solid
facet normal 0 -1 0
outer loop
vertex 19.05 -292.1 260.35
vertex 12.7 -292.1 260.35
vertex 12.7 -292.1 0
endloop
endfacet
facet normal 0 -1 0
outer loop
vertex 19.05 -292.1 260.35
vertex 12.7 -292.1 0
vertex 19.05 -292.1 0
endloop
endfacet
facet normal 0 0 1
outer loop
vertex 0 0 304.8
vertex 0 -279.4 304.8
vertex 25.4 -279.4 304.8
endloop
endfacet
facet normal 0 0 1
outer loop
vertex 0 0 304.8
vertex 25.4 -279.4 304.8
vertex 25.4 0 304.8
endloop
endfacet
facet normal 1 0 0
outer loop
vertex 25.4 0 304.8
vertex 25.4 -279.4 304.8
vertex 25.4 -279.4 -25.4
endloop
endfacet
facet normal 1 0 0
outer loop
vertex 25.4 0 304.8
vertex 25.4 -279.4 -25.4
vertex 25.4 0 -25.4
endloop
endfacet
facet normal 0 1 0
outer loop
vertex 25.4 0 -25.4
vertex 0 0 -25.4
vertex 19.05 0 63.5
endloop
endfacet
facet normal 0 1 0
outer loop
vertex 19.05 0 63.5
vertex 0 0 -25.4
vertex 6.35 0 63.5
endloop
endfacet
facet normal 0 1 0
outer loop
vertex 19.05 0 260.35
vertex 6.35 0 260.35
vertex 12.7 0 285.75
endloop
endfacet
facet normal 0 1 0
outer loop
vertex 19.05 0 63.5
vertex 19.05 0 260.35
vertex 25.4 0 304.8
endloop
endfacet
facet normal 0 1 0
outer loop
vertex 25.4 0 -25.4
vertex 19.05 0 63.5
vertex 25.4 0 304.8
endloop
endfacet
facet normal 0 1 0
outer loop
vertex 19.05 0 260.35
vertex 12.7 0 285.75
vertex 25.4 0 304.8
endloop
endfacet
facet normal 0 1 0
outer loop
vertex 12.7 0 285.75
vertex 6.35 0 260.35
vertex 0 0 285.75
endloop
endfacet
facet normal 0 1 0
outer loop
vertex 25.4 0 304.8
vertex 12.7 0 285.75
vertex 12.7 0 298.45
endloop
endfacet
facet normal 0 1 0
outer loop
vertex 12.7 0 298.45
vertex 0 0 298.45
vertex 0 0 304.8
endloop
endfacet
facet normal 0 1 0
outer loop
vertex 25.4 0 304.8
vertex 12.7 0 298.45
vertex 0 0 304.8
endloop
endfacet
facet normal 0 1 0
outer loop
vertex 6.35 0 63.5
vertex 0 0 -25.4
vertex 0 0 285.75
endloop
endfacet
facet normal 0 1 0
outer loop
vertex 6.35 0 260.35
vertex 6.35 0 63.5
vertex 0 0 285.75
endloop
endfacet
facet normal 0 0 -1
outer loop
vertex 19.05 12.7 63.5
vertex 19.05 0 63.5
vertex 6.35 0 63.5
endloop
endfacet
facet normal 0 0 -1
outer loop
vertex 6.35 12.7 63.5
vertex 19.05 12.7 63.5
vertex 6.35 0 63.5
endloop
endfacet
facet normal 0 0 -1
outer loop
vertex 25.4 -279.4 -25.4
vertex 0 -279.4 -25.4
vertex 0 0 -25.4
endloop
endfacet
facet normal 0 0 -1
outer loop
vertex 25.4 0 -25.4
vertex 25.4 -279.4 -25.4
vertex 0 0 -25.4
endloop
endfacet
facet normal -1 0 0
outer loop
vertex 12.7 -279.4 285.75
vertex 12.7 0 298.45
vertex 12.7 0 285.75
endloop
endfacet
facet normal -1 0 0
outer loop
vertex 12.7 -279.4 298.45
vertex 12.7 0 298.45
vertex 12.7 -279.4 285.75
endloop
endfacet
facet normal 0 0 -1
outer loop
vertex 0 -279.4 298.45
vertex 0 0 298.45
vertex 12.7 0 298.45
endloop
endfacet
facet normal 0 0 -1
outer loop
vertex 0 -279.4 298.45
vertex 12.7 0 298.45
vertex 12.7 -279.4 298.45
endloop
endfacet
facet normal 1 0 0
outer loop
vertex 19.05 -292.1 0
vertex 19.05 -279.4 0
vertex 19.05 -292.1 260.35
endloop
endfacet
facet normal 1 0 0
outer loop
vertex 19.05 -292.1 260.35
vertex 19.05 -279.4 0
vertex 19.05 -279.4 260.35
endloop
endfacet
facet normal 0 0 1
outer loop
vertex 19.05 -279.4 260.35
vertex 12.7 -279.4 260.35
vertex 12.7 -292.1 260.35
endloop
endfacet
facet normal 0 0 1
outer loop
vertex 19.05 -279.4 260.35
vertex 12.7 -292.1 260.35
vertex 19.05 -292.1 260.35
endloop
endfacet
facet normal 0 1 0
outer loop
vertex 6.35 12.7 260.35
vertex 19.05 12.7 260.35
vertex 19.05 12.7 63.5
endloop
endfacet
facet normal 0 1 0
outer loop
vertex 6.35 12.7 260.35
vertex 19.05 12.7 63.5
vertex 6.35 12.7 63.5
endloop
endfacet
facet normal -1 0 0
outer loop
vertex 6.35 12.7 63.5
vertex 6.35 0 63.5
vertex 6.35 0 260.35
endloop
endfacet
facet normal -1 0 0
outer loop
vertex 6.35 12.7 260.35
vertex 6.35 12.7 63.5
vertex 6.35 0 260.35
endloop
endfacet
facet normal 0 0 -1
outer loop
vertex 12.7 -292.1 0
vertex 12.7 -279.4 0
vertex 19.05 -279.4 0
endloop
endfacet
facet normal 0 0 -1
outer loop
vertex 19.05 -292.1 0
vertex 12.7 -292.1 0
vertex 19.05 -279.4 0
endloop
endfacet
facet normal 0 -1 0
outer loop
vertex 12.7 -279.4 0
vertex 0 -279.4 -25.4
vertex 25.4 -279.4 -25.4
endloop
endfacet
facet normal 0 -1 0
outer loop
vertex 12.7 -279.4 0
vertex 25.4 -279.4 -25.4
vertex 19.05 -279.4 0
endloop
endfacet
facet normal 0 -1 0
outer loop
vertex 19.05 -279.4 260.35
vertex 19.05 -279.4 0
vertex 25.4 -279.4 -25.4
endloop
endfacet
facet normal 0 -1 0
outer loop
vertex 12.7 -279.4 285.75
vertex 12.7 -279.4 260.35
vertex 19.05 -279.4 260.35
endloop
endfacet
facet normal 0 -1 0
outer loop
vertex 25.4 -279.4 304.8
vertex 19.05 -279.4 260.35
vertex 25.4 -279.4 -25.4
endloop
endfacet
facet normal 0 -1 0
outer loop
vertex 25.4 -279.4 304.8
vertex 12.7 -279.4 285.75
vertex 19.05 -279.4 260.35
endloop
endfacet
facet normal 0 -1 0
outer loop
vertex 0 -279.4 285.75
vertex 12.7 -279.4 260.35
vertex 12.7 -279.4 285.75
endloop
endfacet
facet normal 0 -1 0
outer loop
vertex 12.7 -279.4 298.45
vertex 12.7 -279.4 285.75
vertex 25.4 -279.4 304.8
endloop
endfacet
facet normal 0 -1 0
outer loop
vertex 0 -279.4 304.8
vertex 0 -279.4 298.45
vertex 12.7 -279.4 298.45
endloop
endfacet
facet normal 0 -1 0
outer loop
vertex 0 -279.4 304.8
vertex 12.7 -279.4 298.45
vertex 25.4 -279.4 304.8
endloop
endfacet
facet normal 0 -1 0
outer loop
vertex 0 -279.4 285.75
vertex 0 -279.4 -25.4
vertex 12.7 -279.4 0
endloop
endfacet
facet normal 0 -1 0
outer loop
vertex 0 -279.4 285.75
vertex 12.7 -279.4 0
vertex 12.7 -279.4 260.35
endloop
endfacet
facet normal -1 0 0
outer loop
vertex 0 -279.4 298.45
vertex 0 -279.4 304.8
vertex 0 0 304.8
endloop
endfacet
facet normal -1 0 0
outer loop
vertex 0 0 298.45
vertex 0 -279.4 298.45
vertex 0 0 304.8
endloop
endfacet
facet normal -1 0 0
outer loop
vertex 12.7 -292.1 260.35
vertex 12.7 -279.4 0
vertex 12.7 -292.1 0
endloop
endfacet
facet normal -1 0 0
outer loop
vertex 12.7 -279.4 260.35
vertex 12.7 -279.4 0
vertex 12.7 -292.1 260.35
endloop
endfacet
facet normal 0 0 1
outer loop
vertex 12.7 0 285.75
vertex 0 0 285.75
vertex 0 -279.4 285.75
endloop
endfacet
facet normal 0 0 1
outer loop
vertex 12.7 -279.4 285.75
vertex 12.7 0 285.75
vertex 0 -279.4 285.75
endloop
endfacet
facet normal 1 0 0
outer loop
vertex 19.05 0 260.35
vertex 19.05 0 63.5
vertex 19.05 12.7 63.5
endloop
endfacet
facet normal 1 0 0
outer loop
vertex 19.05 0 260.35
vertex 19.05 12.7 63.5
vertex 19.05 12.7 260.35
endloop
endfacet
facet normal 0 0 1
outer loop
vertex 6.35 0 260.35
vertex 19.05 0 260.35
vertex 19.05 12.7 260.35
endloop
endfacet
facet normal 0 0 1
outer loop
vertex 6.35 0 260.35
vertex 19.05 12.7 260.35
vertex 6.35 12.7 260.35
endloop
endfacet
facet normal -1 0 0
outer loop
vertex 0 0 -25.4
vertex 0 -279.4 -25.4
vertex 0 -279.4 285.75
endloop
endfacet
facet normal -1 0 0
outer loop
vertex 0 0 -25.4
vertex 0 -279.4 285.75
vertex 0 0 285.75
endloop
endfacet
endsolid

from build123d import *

# Parameters (mm, degrees)
F0_W     = 279.4
F0_H     = 304.8
F1_DEPTH = 25.4
F2_W     = 279.4
F2_H     = 25.4
F3_DEPTH = 25.4
F4_W     = 279.4
F4_H     = 12.7
F5_DEPTH = 12.7
F6_W     = 6.35
F6_H     = 260.35
F7_DEPTH = 12.7
F8_W     = 12.7
F8_H     = 196.85
F9_DEPTH = 12.7


with BuildPart() as f1:
    # F0 (on Right) → F1 (new body)
    with BuildSketch(Plane.YZ):
        with Locations((-139.7, 152.4)):
            Rectangle(F0_W, F0_H)
    extrude(amount=F1_DEPTH)

    # F2 (on Right) → F3 (join)
    with BuildSketch(Plane.YZ):
        with Locations((-139.7, -12.7)):
            Rectangle(F2_W, F2_H)
    extrude(amount=F3_DEPTH)

    # F4 (on face) → F5 (cut)
    with BuildSketch(Plane(origin=(0, 0, 0), x_dir=(0, -1, 0), z_dir=(-1, 0, 0))):
        with Locations((139.7, 292.1)):
            Rectangle(F4_W, F4_H)
    extrude(amount=-F5_DEPTH, mode=Mode.SUBTRACT)

    # F6 (on face) → F7 (join)
    with BuildSketch(Plane.XZ.offset(279.4)):
        with Locations((15.875, 130.175)):
            Rectangle(F6_W, F6_H)
    extrude(amount=F7_DEPTH)

    # F8 (on face) → F9 (join)
    with BuildSketch(Plane(origin=(0, 0, 0), x_dir=(-1, 0, 0), z_dir=(0, 1, 0))):
        with Locations((-12.7, 161.925)):
            Rectangle(F8_W, F8_H)
    extrude(amount=F9_DEPTH)


solid = f1.part
